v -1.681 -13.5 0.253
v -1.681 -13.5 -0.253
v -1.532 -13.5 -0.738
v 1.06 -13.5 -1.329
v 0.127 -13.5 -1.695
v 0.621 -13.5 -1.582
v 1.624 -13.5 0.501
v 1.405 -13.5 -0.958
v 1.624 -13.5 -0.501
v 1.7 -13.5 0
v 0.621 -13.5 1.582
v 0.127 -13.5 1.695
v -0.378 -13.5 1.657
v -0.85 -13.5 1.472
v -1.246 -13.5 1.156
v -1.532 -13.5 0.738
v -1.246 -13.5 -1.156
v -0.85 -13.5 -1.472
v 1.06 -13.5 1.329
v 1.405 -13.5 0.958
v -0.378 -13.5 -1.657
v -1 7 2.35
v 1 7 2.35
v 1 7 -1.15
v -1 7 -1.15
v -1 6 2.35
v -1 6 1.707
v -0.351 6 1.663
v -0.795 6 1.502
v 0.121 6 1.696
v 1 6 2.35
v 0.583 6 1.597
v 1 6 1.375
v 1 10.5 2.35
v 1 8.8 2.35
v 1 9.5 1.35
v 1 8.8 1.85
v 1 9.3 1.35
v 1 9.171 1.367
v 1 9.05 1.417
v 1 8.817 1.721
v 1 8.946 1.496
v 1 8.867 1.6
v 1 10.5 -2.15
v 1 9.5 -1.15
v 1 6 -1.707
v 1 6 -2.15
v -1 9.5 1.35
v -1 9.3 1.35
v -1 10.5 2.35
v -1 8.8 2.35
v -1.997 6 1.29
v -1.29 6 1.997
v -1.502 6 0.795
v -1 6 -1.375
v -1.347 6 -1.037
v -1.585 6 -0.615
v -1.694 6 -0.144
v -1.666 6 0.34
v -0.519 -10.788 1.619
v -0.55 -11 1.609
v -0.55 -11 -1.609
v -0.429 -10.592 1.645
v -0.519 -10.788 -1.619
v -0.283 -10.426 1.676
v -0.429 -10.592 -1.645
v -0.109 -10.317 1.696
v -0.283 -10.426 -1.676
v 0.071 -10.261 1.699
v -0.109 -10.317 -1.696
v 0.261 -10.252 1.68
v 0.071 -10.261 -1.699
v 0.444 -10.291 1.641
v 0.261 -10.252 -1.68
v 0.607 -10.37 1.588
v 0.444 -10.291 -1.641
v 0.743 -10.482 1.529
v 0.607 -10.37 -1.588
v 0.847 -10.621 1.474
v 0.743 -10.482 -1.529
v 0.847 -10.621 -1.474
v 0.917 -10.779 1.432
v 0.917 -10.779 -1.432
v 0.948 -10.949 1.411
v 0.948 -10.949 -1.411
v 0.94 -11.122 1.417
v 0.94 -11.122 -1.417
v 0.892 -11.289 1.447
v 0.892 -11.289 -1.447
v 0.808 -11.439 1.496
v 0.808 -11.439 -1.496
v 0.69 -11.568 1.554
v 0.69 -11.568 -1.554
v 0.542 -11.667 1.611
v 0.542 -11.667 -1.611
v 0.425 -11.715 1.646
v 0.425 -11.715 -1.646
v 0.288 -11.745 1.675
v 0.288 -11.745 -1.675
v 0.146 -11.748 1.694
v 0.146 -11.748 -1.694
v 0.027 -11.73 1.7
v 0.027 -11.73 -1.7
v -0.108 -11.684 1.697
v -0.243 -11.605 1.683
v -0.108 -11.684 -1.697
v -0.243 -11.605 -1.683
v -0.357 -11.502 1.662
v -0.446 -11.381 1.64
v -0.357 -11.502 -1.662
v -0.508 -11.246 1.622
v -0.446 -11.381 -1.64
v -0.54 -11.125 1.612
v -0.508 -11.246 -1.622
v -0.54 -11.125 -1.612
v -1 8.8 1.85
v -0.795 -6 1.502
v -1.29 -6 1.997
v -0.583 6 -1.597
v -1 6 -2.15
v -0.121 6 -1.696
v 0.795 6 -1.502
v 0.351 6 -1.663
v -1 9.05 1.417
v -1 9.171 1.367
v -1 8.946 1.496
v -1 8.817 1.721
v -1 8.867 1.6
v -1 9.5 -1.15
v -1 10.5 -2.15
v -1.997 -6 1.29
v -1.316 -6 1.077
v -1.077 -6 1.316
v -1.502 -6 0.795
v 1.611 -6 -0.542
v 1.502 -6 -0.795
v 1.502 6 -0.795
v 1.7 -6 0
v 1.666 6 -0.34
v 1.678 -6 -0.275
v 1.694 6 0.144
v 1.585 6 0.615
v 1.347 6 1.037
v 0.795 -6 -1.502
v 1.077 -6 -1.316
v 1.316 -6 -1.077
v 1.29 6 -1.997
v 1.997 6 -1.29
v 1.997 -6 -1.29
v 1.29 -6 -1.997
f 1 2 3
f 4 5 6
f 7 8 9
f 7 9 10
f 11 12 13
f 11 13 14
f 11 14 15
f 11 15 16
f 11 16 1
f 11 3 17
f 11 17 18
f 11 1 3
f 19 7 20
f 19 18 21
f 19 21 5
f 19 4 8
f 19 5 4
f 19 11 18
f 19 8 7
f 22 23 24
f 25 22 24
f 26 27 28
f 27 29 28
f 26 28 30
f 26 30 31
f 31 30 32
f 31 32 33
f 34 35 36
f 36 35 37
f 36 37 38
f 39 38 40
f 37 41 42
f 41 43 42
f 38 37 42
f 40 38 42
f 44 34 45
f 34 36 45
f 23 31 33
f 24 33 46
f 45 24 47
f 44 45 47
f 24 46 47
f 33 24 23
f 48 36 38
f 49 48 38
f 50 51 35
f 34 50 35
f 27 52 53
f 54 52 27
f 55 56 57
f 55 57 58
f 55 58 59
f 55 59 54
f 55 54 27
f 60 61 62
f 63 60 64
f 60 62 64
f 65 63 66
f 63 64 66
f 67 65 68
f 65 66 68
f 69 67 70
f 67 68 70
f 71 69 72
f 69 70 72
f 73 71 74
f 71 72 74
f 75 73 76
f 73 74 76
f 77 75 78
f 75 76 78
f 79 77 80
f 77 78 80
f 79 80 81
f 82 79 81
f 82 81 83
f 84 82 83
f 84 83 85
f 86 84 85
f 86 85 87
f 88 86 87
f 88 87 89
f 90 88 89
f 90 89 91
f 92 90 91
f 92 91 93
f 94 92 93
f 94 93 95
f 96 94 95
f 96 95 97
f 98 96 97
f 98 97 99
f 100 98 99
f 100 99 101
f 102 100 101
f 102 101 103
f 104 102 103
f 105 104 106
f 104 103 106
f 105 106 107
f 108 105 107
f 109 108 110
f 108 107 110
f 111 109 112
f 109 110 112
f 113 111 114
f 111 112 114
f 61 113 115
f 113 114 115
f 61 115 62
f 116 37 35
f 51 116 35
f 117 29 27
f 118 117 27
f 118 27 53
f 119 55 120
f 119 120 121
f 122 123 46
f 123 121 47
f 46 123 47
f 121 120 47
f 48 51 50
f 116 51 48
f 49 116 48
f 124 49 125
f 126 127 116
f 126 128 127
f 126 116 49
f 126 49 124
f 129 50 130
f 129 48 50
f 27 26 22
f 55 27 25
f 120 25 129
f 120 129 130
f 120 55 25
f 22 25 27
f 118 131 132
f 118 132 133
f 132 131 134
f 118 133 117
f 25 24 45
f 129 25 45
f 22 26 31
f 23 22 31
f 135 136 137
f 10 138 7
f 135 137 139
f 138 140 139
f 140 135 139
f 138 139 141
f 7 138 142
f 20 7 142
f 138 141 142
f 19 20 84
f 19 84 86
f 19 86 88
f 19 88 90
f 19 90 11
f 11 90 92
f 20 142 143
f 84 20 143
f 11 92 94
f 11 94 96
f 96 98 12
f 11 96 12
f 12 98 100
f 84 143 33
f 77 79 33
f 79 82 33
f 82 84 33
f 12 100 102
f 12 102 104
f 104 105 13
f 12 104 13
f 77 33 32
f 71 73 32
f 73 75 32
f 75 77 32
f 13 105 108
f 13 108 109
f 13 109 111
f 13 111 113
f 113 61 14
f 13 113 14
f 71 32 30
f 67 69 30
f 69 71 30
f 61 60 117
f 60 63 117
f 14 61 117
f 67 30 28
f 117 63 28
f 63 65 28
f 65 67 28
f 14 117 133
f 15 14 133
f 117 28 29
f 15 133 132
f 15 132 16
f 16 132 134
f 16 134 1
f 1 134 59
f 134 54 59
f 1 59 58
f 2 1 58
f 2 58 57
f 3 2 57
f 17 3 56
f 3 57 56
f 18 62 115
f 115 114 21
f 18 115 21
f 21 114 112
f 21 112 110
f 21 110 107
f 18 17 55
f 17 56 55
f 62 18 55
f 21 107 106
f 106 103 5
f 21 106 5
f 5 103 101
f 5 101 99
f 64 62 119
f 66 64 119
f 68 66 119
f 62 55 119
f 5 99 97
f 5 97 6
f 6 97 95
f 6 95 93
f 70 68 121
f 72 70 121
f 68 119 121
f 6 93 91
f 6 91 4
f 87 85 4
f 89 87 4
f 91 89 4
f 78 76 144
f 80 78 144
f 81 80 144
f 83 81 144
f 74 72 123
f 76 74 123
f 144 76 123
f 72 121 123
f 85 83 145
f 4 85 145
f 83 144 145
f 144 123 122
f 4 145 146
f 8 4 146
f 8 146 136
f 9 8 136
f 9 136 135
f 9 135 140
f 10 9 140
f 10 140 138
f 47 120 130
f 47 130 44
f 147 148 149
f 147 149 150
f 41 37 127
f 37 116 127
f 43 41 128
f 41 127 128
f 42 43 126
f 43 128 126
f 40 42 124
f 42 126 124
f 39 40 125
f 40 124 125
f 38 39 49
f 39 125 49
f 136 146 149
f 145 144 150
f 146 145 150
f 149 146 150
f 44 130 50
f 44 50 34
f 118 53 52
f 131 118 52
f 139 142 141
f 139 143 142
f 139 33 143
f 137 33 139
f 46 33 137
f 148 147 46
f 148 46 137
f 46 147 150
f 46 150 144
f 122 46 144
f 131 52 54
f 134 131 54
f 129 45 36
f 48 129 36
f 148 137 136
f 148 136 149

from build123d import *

# Parameters (mm, degrees)
SKETCH1_R             = 1.7
MAIN_SHAFT_DEPTH      = 6
GUIDES_DEPTH          = 12
SKETCH21_W            = 2
SKETCH21_H            = 4.5
HOOK_EXTRUDE_DEPTH    = 4.5
HOOK_CUT_DEPTH        = 3.997440667
HOOK_FILLET_R         = 0.5
SKETCH23_R            = 1.7
TOP_STOPPER_DEPTH     = 2
SKETCH24_R            = 1.7
BOTTOM_SHAFT_DEPTH    = 5.5
F_1_5MM_DOWEL_HOLE2_D = 1.5


with BuildPart() as part:
    # Sketch1 → main shaft (new body, symmetric)
    with BuildSketch(Plane(origin=(0, 0, 0), x_dir=(1, 0, 0), z_dir=(0, 1, 0))):
        Circle(SKETCH1_R)
    extrude(amount=MAIN_SHAFT_DEPTH, both=True)

    # Sketch2 → guides (add)
    with BuildSketch(Plane(origin=(0, 6, 0), x_dir=(1, 0, 0), z_dir=(0, 1, 0))):
        with BuildLine():
            Line((-0.795359139, -1.50246592), (-1.290333886, -1.997440667))
            Line((-1.290333886, -1.997440667), (-1.997440667, -1.290333886))
            Line((-1.997440667, -1.290333886), (-1.50246592, -0.795359139))
            ThreePointArc((-1.50246592, -0.795359139), (-1.202081528, -1.202081528), (-0.795359139, -1.50246592))
        make_face()
        with BuildLine():
            Line((1.290333886, 1.997440667), (0.795359139, 1.50246592))
            ThreePointArc((0.795359139, 1.50246592), (1.202081528, 1.202081528), (1.50246592, 0.795359139))
            Line((1.50246592, 0.795359139), (1.997440667, 1.290333886))
            Line((1.997440667, 1.290333886), (1.290333886, 1.997440667))
        make_face()
    extrude(amount=-GUIDES_DEPTH)

    # Sketch21 → hook extrude (add)
    with BuildSketch(Plane(origin=(0, 6, 0), x_dir=(1, 0, 0), z_dir=(0, 1, 0))):
        with Locations((0, -0.1)):
            Rectangle(SKETCH21_W, SKETCH21_H)
    extrude(amount=HOOK_EXTRUDE_DEPTH)

    # Sketch22 → hook cut (cut, through all)
    with BuildSketch(Plane(origin=(1, 0, 0), x_dir=(0, 0, -1), z_dir=(1, 0, 0))):
        Polygon((-2.35, 7), (1.15, 7), (1.15, 9.5), (-1.35, 9.5), (-1.35, 8.8), (-2.35, 8.8), align=None)
    extrude(amount=-HOOK_CUT_DEPTH, mode=Mode.SUBTRACT)

    # hook fillet
    hook_fillet_edges = [part.edges().sort_by_distance(p)[0] for p in [
        (0, 8.8, 1.35),
    ]]
    fillet(hook_fillet_edges, radius=HOOK_FILLET_R)

    # Sketch23 → top stopper (add)
    with BuildSketch(Plane.XZ.offset(6)):
        Circle(SKETCH23_R)
    extrude(amount=TOP_STOPPER_DEPTH)

    # Sketch24 → bottom shaft (add)
    with BuildSketch(Plane.XZ.offset(8)):
        Circle(SKETCH24_R)
    extrude(amount=BOTTOM_SHAFT_DEPTH)

    # Ø1.5mm Dowel Hole2 (through all)
    with Locations(Plane.XY.offset(2.35)):
        with Locations((0.2, -11)):
            Hole(F_1_5MM_DOWEL_HOLE2_D / 2)


solid = part.part
